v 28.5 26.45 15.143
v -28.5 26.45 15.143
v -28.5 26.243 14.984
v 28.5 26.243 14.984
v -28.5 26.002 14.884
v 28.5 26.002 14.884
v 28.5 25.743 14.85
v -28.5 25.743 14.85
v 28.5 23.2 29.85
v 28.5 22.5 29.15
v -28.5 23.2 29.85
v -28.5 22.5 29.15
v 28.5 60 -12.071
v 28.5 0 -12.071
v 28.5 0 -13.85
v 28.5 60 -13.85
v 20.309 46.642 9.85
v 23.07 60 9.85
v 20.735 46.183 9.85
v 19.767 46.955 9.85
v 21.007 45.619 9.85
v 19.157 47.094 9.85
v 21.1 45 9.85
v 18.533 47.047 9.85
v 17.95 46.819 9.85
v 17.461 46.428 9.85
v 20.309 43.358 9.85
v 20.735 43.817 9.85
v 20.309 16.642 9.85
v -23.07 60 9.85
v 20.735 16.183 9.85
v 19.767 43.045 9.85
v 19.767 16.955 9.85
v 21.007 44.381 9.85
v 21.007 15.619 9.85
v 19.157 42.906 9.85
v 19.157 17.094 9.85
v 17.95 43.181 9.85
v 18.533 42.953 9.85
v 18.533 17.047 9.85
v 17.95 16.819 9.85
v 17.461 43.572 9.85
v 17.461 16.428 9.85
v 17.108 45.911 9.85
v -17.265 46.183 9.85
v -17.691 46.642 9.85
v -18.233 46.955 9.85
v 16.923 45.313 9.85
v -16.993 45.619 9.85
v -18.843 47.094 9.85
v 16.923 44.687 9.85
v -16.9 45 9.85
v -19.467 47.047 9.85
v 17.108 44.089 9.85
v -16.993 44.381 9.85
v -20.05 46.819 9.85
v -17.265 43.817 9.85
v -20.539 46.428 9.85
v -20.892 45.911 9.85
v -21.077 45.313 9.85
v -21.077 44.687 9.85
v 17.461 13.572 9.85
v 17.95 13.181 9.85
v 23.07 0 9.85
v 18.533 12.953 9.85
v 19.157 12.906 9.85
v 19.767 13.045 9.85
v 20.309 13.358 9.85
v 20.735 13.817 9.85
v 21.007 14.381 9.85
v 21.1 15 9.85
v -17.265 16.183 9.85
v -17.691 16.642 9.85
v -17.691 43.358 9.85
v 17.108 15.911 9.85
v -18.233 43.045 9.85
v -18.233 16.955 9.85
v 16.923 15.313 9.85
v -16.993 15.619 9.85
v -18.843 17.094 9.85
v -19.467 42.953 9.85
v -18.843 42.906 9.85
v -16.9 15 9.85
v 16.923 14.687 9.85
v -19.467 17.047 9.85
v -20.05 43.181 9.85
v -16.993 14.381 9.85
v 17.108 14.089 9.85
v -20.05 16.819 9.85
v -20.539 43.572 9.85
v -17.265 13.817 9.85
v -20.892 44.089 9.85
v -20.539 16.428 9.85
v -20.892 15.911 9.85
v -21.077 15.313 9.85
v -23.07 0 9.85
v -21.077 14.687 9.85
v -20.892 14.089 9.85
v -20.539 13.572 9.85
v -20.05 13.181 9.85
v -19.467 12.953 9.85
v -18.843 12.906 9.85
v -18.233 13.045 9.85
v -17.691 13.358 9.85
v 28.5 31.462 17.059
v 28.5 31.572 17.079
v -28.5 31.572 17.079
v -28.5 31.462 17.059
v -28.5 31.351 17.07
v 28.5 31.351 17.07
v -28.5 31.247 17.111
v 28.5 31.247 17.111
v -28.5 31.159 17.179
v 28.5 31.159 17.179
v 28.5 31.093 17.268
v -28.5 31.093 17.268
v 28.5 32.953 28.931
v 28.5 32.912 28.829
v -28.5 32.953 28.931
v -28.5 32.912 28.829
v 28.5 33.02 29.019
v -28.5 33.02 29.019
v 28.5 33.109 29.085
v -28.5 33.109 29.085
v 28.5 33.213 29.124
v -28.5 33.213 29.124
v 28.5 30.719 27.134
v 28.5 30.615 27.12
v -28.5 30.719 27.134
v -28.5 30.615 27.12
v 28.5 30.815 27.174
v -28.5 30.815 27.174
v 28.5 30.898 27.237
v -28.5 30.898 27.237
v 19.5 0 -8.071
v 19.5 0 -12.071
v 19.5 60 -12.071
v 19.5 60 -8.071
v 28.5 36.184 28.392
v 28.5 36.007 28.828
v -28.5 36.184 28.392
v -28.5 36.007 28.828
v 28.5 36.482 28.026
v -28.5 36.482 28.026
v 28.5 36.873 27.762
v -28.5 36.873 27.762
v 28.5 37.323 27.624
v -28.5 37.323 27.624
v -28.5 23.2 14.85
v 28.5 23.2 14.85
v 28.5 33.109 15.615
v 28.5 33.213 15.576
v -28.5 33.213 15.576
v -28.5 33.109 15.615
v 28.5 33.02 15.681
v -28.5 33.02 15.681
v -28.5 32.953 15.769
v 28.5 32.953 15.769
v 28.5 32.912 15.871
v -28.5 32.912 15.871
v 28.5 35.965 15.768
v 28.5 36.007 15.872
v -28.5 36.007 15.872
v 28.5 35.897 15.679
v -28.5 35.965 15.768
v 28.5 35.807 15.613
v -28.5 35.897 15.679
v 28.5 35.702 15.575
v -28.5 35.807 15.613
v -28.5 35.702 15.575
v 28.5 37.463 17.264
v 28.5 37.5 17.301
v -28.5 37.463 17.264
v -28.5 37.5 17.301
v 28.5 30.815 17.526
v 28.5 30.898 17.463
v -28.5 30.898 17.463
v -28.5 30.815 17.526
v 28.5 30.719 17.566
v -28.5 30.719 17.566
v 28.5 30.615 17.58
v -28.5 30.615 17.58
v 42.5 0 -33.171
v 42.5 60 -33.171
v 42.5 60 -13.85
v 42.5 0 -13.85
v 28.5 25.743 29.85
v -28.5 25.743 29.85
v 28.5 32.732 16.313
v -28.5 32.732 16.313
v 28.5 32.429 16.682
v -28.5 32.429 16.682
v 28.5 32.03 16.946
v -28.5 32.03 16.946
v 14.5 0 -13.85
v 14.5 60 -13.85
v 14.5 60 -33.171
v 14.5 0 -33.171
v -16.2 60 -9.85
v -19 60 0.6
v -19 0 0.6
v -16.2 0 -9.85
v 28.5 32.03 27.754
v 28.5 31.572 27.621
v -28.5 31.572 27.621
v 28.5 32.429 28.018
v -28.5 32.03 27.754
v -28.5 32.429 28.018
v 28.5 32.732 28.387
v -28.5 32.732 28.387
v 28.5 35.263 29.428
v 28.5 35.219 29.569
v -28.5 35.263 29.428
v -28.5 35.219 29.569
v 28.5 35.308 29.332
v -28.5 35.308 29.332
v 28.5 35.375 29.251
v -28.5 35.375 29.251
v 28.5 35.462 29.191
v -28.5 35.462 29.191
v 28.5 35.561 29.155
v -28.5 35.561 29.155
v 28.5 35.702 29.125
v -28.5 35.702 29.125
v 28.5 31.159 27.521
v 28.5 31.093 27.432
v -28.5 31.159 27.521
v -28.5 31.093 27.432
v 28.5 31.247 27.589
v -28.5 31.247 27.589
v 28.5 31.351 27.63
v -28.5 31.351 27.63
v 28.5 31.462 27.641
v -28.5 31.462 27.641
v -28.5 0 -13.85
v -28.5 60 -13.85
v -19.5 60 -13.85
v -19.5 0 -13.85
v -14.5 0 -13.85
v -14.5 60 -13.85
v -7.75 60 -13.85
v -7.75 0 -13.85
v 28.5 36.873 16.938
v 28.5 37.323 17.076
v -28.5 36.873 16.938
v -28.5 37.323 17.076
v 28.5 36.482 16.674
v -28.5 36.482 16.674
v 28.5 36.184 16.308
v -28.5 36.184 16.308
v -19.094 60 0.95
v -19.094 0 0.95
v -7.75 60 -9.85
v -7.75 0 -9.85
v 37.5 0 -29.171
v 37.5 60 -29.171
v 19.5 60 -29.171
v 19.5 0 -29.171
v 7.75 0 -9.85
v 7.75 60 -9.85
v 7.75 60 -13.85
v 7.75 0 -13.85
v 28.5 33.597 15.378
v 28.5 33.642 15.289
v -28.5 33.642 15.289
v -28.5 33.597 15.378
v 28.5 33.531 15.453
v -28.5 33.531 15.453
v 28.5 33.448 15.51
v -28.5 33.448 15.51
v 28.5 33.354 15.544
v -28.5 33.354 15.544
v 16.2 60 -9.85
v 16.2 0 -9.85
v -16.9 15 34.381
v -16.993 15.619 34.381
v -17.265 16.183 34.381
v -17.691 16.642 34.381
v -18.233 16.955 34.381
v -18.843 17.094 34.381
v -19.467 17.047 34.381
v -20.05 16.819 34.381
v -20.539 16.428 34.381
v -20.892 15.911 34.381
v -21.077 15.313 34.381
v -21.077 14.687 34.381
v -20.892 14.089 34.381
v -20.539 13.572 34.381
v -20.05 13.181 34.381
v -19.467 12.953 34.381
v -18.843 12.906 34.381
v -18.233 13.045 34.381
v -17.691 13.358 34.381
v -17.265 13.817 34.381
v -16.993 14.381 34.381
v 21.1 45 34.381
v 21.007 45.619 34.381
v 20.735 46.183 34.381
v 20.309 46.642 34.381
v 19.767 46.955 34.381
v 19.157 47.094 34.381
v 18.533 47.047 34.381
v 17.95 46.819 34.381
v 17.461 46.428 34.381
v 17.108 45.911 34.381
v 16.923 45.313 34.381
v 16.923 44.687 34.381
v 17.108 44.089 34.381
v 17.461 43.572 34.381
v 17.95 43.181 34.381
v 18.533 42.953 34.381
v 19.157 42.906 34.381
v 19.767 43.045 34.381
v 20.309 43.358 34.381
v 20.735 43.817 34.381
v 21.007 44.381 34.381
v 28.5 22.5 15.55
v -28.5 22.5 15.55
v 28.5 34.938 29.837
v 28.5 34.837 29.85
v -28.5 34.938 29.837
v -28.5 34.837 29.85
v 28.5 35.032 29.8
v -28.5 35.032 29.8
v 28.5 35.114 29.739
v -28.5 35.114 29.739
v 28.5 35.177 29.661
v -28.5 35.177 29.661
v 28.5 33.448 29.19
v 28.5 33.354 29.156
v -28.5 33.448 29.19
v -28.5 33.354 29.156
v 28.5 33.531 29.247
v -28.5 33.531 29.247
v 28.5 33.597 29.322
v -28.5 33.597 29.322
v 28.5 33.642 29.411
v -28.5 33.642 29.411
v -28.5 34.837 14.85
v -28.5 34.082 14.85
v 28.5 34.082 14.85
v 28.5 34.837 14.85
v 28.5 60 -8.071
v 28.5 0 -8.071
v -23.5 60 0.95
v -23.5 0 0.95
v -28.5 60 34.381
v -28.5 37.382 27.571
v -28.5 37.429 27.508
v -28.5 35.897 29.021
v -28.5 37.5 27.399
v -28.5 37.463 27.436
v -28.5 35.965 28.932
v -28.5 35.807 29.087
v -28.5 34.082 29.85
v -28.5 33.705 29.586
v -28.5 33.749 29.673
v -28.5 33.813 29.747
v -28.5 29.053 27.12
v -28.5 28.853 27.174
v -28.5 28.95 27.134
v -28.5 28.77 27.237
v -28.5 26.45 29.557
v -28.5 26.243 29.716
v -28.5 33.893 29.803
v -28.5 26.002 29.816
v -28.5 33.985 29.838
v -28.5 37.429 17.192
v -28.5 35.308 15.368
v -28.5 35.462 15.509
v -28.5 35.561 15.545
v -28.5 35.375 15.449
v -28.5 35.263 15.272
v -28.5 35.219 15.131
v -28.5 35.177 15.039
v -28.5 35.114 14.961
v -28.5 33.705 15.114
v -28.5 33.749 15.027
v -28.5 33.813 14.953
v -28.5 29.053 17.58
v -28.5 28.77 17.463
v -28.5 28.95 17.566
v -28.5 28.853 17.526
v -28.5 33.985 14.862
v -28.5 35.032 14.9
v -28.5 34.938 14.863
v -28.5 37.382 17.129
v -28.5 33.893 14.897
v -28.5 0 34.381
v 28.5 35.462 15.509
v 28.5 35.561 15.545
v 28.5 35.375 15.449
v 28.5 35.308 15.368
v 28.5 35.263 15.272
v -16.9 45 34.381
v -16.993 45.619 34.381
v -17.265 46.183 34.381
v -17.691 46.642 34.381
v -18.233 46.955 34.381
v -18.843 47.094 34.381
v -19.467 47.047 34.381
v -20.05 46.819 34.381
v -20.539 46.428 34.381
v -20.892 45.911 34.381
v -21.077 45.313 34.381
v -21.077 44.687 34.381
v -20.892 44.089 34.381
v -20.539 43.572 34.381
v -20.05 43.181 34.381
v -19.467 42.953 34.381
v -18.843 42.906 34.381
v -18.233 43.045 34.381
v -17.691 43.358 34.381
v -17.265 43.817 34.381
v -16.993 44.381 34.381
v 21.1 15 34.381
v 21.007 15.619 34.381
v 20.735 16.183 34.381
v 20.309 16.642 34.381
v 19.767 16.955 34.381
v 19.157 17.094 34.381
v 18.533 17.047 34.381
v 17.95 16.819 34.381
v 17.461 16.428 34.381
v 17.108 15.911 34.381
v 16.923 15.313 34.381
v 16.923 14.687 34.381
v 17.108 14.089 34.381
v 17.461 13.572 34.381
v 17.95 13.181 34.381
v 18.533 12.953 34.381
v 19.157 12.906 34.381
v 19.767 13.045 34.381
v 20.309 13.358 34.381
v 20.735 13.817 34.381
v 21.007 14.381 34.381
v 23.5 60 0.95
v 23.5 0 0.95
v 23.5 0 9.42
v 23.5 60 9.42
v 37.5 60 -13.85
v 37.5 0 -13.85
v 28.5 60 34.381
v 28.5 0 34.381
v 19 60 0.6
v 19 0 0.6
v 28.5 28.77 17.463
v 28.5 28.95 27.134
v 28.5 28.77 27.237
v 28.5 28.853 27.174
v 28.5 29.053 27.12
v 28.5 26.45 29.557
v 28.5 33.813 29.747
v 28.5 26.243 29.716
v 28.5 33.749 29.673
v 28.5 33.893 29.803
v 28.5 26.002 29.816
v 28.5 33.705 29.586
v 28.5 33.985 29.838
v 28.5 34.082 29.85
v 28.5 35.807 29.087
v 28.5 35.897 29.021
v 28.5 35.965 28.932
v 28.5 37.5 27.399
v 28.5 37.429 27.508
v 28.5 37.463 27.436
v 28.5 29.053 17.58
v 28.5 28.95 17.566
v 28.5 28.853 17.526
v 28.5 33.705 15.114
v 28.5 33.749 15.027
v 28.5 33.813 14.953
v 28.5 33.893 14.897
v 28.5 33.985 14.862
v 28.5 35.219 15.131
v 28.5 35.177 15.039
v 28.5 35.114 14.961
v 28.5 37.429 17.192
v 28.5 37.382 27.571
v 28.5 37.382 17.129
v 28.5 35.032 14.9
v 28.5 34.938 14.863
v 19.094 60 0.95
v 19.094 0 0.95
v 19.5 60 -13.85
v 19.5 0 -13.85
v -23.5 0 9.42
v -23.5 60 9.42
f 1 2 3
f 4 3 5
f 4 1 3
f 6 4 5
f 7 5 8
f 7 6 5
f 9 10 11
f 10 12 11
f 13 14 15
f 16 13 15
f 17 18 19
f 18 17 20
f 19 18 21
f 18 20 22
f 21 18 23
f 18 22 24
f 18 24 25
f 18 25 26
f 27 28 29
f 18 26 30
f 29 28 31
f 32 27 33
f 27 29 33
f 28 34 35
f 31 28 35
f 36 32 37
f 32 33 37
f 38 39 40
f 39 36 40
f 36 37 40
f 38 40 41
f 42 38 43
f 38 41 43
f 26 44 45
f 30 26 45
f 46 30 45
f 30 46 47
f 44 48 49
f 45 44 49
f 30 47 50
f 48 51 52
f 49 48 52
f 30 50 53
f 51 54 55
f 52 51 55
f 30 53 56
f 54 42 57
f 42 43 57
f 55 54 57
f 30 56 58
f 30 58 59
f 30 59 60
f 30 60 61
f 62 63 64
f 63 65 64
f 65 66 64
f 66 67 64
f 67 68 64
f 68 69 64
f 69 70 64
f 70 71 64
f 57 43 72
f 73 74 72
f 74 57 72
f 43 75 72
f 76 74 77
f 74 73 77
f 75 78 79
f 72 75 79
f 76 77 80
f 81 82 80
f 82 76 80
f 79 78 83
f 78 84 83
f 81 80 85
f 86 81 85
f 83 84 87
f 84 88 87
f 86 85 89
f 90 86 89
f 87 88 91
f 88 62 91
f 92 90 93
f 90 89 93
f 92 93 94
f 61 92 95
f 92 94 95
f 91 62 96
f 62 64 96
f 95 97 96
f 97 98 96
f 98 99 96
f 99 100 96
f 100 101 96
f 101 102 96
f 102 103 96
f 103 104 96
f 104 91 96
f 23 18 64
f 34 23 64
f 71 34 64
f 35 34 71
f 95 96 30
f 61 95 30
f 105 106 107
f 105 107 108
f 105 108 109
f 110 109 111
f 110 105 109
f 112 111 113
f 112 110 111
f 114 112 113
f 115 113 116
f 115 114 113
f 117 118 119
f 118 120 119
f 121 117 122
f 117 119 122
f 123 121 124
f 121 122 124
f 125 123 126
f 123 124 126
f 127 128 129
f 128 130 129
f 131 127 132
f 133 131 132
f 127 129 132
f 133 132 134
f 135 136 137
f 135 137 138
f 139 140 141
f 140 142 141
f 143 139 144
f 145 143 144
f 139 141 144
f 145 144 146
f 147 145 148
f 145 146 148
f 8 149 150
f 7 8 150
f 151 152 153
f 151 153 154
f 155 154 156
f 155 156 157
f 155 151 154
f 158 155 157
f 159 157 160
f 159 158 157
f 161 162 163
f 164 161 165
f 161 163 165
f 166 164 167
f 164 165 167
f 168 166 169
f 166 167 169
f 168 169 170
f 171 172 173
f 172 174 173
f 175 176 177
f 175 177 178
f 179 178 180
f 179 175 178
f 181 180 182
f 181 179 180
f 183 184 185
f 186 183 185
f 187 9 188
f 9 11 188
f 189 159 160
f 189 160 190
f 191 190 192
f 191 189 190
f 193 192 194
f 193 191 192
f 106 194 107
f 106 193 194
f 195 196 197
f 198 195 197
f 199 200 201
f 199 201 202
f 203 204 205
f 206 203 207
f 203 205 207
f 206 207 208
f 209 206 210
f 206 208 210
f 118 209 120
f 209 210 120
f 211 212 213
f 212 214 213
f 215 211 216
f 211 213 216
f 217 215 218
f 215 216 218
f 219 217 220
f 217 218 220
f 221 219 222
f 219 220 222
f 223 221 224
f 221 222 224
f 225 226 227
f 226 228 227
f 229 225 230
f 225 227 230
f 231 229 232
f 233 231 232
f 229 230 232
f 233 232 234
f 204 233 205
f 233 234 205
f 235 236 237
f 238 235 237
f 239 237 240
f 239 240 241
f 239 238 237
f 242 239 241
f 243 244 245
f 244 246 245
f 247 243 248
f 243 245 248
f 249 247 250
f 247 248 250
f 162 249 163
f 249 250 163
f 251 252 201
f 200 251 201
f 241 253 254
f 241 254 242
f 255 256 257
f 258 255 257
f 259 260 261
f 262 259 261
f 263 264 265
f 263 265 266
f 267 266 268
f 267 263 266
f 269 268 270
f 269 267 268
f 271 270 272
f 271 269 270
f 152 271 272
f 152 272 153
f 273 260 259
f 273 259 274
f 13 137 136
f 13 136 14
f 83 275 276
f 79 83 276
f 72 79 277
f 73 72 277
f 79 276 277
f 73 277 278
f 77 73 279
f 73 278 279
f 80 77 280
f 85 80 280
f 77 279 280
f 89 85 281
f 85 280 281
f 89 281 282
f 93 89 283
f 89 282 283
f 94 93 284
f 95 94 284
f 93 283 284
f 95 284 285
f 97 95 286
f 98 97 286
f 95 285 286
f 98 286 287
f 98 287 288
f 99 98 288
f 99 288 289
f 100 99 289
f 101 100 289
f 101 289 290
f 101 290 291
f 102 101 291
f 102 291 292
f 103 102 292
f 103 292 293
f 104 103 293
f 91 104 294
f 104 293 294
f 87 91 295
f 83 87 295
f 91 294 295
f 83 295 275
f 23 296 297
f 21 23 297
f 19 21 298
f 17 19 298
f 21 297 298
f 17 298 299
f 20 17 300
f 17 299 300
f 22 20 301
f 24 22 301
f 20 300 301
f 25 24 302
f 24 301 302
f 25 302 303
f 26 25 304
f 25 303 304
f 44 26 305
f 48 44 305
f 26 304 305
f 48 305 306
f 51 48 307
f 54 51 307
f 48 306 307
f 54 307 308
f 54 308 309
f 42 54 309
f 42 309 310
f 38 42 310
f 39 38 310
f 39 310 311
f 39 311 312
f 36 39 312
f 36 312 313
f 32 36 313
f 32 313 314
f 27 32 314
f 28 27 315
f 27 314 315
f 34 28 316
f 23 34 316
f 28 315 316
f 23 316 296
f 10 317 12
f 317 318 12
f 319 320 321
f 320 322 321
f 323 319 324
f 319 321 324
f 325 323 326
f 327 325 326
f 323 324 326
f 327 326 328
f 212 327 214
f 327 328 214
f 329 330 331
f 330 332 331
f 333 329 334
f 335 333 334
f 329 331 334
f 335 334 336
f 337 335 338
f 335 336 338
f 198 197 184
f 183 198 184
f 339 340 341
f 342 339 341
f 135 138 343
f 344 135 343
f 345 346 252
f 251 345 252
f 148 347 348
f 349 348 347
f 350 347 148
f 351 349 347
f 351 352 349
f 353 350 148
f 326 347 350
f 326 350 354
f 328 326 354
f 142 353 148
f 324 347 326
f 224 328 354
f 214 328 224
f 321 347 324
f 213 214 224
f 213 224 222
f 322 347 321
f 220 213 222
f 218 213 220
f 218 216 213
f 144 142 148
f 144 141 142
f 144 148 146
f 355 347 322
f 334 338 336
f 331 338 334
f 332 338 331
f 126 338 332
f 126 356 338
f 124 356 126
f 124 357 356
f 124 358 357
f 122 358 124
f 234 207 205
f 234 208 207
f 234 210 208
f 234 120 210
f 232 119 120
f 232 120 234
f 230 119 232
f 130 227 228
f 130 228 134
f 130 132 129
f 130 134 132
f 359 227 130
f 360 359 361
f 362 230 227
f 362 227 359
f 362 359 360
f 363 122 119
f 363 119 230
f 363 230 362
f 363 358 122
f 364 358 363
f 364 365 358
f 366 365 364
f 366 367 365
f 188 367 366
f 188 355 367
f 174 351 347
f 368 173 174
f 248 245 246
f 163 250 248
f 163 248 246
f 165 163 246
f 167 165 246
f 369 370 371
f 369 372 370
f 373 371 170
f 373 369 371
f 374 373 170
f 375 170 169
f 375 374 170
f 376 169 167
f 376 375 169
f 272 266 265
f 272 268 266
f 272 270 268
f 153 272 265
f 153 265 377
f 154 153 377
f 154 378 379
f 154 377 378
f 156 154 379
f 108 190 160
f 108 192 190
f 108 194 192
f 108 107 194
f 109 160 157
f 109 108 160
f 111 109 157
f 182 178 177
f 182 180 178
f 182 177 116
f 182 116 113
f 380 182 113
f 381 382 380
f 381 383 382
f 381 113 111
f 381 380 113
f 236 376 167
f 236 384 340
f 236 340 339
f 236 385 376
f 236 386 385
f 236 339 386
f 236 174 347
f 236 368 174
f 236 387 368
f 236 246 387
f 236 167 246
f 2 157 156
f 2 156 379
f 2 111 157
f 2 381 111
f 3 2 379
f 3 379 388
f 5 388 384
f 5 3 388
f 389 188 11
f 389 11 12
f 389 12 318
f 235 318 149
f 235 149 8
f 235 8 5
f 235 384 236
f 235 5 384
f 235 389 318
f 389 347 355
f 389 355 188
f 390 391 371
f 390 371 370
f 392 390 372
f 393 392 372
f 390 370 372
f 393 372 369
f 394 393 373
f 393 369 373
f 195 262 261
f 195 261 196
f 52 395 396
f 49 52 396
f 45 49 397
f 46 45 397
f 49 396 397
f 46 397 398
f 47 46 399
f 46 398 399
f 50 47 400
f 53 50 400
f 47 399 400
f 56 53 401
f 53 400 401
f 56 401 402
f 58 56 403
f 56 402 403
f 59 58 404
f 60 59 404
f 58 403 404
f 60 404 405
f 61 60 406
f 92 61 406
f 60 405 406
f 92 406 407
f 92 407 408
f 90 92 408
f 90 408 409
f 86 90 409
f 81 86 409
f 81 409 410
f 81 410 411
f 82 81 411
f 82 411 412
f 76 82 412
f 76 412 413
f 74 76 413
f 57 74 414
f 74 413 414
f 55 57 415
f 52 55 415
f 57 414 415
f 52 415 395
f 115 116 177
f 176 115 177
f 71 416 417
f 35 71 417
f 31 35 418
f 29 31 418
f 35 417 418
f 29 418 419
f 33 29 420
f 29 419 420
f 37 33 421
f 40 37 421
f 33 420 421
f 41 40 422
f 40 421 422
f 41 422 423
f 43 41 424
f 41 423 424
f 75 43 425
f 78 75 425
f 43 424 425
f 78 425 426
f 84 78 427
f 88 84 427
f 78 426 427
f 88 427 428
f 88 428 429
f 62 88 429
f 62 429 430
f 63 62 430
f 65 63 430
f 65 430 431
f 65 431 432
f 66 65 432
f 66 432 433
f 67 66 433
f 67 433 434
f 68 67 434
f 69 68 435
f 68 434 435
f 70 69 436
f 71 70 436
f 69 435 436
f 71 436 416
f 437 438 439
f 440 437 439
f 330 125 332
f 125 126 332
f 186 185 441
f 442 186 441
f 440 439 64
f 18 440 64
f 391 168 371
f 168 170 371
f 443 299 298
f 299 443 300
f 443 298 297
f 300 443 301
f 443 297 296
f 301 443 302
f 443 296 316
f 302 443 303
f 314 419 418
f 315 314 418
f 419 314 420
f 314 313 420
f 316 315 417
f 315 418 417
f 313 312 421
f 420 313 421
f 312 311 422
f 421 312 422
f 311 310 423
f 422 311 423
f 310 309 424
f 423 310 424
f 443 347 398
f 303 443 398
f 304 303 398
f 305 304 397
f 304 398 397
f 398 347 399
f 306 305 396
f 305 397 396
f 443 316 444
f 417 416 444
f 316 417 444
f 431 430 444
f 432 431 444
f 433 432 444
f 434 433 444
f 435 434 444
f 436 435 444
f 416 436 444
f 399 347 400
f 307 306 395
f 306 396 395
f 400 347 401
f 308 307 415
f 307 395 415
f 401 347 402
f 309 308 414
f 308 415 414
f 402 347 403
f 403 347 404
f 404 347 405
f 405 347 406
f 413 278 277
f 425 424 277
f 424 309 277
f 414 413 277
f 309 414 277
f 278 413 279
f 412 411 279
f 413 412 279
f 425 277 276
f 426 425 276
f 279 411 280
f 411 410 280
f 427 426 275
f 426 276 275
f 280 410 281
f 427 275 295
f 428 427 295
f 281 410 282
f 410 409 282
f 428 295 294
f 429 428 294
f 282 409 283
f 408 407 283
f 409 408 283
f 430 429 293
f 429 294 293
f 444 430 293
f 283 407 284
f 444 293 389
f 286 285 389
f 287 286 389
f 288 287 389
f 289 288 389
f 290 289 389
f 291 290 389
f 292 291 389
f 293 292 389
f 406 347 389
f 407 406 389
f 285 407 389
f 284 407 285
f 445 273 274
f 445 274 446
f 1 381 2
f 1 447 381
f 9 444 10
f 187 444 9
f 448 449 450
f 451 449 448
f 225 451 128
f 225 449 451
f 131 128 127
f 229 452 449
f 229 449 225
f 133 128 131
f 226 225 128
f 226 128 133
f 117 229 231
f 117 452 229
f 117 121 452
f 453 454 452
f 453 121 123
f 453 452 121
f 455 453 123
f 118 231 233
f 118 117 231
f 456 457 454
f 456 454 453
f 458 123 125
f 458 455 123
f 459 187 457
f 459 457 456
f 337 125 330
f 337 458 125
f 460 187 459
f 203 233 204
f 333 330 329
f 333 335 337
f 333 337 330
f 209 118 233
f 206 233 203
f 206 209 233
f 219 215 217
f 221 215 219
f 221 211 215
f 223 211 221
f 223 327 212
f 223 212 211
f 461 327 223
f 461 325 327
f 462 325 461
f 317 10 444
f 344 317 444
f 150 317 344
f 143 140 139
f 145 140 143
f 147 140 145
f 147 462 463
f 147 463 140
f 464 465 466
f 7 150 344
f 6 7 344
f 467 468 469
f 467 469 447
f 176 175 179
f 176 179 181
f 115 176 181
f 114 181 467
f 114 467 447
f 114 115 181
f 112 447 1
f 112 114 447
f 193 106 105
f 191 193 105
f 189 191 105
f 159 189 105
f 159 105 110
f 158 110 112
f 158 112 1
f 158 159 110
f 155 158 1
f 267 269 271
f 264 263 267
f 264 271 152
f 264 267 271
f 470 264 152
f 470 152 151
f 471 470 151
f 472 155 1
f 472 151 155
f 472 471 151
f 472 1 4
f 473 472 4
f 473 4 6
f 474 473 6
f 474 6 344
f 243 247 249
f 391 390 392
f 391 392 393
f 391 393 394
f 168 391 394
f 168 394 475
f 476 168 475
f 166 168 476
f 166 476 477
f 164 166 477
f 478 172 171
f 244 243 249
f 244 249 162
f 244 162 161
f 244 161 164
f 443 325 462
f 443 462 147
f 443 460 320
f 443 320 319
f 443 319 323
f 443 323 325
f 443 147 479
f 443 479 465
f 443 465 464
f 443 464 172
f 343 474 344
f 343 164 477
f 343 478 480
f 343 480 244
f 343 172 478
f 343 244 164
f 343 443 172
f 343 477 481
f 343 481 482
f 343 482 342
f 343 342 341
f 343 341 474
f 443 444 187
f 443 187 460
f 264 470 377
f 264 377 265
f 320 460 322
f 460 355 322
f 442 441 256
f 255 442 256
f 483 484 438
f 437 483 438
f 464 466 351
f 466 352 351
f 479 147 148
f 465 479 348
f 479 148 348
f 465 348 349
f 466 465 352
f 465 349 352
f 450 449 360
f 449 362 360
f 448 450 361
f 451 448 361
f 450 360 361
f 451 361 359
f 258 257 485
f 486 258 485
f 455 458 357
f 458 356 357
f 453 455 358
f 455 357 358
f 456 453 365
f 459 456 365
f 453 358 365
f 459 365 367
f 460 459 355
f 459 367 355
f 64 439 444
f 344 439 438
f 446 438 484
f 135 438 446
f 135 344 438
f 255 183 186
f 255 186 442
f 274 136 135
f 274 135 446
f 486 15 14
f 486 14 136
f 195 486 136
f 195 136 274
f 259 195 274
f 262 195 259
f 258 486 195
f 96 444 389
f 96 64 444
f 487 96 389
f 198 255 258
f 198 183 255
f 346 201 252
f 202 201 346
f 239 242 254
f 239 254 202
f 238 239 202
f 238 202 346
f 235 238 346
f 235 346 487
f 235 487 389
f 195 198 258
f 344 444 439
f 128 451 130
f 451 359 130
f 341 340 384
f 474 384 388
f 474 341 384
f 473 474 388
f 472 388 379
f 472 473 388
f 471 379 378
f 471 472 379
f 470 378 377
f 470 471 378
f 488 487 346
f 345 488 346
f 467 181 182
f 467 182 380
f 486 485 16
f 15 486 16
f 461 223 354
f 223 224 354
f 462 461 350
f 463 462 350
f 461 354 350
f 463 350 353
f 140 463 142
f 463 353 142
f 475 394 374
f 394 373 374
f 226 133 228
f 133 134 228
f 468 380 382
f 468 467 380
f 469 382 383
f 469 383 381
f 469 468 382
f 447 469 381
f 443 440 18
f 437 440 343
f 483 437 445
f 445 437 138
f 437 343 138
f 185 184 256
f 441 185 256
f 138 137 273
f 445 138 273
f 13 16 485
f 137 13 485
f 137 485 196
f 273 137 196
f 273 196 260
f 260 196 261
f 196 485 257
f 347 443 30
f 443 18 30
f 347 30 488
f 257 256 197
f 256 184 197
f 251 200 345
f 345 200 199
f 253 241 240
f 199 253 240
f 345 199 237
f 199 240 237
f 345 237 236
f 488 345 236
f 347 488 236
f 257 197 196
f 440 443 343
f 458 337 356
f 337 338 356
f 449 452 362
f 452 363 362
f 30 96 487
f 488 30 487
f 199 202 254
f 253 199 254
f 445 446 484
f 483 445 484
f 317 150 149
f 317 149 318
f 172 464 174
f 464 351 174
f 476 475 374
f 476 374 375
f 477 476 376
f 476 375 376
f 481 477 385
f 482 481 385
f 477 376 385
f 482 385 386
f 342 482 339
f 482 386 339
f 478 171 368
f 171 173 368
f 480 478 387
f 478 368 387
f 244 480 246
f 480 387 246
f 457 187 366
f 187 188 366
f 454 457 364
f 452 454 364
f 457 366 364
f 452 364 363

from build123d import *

# Parameters (mm, degrees)
SKETCH1_W           = 57
SKETCH1_H           = 28.7
BOSS_EXTRUDE1_DEPTH = 60
SKETCH2_W           = 9
SKETCH2_H           = 4
CUT_EXTRUDE1_DEPTH  = 69.064473112
BOSS_EXTRUDE2_DEPTH = 28.5
SKETCH6_W           = 15.5
SKETCH6_H           = 15.390476131
CUT_EXTRUDE2_DEPTH  = 80
BOSS_EXTRUDE5_DEPTH = 60
SKETCH10_R          = 2.1
CUT_EXTRUDE3_DEPTH  = 24.530533394
SKETCH11_W          = 40.163550966
SKETCH11_H          = 20.084690285
CUT_EXTRUDE4_DEPTH  = 82.168165413
SKETCH12_W          = 9
SKETCH12_H          = 4
BOSS_EXTRUDE6_DEPTH = 60


with BuildPart() as part:
    # Sketch1 → Boss-Extrude1 (new body)
    with BuildSketch(Plane(origin=(0, 0, 0), x_dir=(1, 0, 0), z_dir=(0, 1, 0))):
        with Locations((0, -0.5)):
            Rectangle(SKETCH1_W, SKETCH1_H)
        Polygon((23.07, -9.85), (-23.07, -9.85), (-23.5, -9.42), (-23.5, -0.95), (-19.09385128, -0.95), (-19, -0.599742255), (-16.2, 9.85), (16.2, 9.85), (19, -0.599742255), (19.09385128, -0.95), (23.5, -0.95), (23.5, -2.9), (23.5, -9.42), align=None, mode=Mode.SUBTRACT)
    extrude(amount=BOSS_EXTRUDE1_DEPTH)

    # Sketch2 → Cut-Extrude1 (cut, through all)
    with BuildSketch(Plane.XZ):
        with Locations((24, -10.0706285)):
            Rectangle(SKETCH2_W, SKETCH2_H)
        with Locations((-24, -10.0706285)):
            Rectangle(SKETCH2_W, SKETCH2_H)
    extrude(amount=-CUT_EXTRUDE1_DEPTH, mode=Mode.SUBTRACT)

    # Sketch5 → Boss-Extrude2 (add, symmetric)
    with BuildSketch(Plane(origin=(0, 0, 0), x_dir=(0, 0, -1), z_dir=(1, 0, 0))):
        with BuildLine():
            Line((-14.85, 0), (-14.85, 23.200000017))
            Line((-14.85, 23.200000017), (-15.549999973, 22.50000003))
            Line((-15.549999973, 22.50000003), (-29.149999973, 22.50000003))
            Line((-29.149999973, 22.50000003), (-29.849999973, 23.20000003))
            Line((-29.849999973, 23.20000003), (-29.849999973, 25.743360053))
            ThreePointArc((-29.849999973, 25.743360053), (-29.773879502, 26.126043492), (-29.557106746, 26.450466847))
            Line((-29.557106746, 26.450466847), (-27.237157266, 28.770416328))
            ThreePointArc((-27.237157266, 28.770416328), (-27.150448162, 28.900185674), (-27.119999973, 29.053259055))
            Line((-27.119999973, 29.053259055), (-27.119999973, 30.615319642))
            ThreePointArc((-27.119999973, 30.615319642), (-27.150448164, 30.768393021), (-27.237157268, 30.898162365))
            Line((-27.237157268, 30.898162365), (-27.431588163, 31.09259326))
            ThreePointArc((-27.431588163, 31.09259326), (-27.613507965, 31.297692563), (-27.620638933, 31.57175403))
            ThreePointArc((-27.620638933, 31.57175403), (-28.017573243, 32.42857618), (-28.828543655, 32.91234062))
            ThreePointArc((-28.828543655, 32.91234062), (-29.01918836, 33.020436377), (-29.124259054, 33.212764861))
            Line((-29.124259054, 33.212764861), (-29.156235284, 33.354092333))
            ThreePointArc((-29.156235284, 33.354092333), (-29.24659278, 33.53064407), (-29.410649592, 33.642090719))
            Line((-29.410649592, 33.642090719), (-29.585724304, 33.70524196))
            ThreePointArc((-29.585724304, 33.70524196), (-29.777329878, 33.851609246), (-29.849999973, 34.081511694))
            Line((-29.849999973, 34.081511694), (-29.849999973, 34.837490602))
            ThreePointArc((-29.849999973, 34.837490602), (-29.772088513, 35.074680338), (-29.568705112, 35.219471078))
            Line((-29.568705112, 35.219471078), (-29.427668799, 35.263299846))
            ThreePointArc((-29.427668799, 35.263299846), (-29.25116358, 35.375371369), (-29.155313737, 35.561185593))
            Line((-29.155313737, 35.561185593), (-29.125010632, 35.702102112))
            ThreePointArc((-29.125010632, 35.702102112), (-29.020526118, 35.897067182), (-28.828406063, 36.006695082))
            ThreePointArc((-28.828406063, 36.006695082), (-28.025619489, 36.481556021), (-27.62403672, 37.32339358))
            ThreePointArc((-27.62403672, 37.32339358), (-27.540484938, 37.407225271), (-27.43605838, 37.46293655))
            Line((-27.43605838, 37.46293655), (-27.39899493, 37.5))
            Line((-27.39899493, 37.5), (-17.30100503, 37.5))
            Line((-17.30100503, 37.5), (-17.26394158, 37.46293655))
            ThreePointArc((-17.26394158, 37.46293655), (-17.159515017, 37.407225278), (-17.07596324, 37.32339358))
            ThreePointArc((-17.07596324, 37.32339358), (-16.674380468, 36.481556018), (-15.871593887, 36.006695079))
            ThreePointArc((-15.871593887, 36.006695079), (-15.679473839, 35.897067189), (-15.574989331, 35.702102127))
            Line((-15.574989331, 35.702102127), (-15.544686222, 35.561185587))
            ThreePointArc((-15.544686222, 35.561185587), (-15.448836377, 35.375371364), (-15.272331158, 35.263299843))
            Line((-15.272331158, 35.263299843), (-15.131294869, 35.219471083))
            ThreePointArc((-15.131294869, 35.219471083), (-14.927911462, 35.074680333), (-14.85, 34.837490586))
            Line((-14.85, 34.837490586), (-14.85, 60))
            Line((-14.85, 60), (-34.380533394, 60))
            Line((-34.380533394, 60), (-34.380533394, 0))
            Line((-34.380533394, 0), (-14.85, 0))
        make_face()
        with BuildLine():
            ThreePointArc((-15.142893227, 26.450466847), (-14.926120471, 26.126043492), (-14.85, 25.743360053))
            Line((-14.85, 25.743360053), (-14.85, 34.081511674))
            ThreePointArc((-14.85, 34.081511674), (-14.922670087, 33.851609245), (-15.114275644, 33.70524197))
            Line((-15.114275644, 33.70524197), (-15.289350386, 33.642090718))
            ThreePointArc((-15.289350386, 33.642090718), (-15.453407192, 33.53064407), (-15.543764688, 33.354092339))
            Line((-15.543764688, 33.354092339), (-15.57574092, 33.21276486))
            ThreePointArc((-15.57574092, 33.21276486), (-15.680811613, 33.020436377), (-15.871456319, 32.91234062))
            ThreePointArc((-15.871456319, 32.91234062), (-16.68242673, 32.42857618), (-17.07936104, 31.57175403))
            ThreePointArc((-17.07936104, 31.57175403), (-17.086492012, 31.297692565), (-17.26841181, 31.09259326))
            Line((-17.26841181, 31.09259326), (-17.462842708, 30.898162362))
            ThreePointArc((-17.462842708, 30.898162362), (-17.549551812, 30.768393016), (-17.58, 30.615319635))
            Line((-17.58, 30.615319635), (-17.58, 29.053259048))
            ThreePointArc((-17.58, 29.053259048), (-17.54955181, 28.900185669), (-17.462842705, 28.770416325))
            Line((-17.462842705, 28.770416325), (-15.142893227, 26.450466847))
        make_face()
    extrude(amount=BOSS_EXTRUDE2_DEPTH, both=True)

    # Sketch6 → Cut-Extrude2 (cut)
    with BuildSketch(Plane(origin=(0, 60, 0), x_dir=(1, 0, 0), z_dir=(0, 1, 0))):
        with Locations((0, 12.050145064)):
            Rectangle(SKETCH6_W, SKETCH6_H)
    extrude(amount=-CUT_EXTRUDE2_DEPTH, mode=Mode.SUBTRACT)

    # Sketch9 → Boss-Extrude5 (add)
    with BuildSketch(Plane(origin=(0, 60, 0), x_dir=(1, 0, 0), z_dir=(0, 1, 0))):
        Polygon((-19.5, 13.85), (-19.5, 29.1706285), (-37.5, 29.1706285), (-37.5, 13.85), (-42.5, 13.85), (-42.5, 33.1706285), (-14.5, 33.1706285), (-14.5, 13.85), align=None)
        Polygon((37.5, 13.85), (37.5, 29.1706285), (19.5, 29.1706285), (19.5, 13.85), (14.5, 13.85), (14.5, 33.1706285), (42.5, 33.1706285), (42.5, 13.85), align=None)
    extrude(amount=-BOSS_EXTRUDE5_DEPTH)

    # Sketch10 → Cut-Extrude3 (cut)
    with BuildSketch(Plane.XY.offset(34.380533394)):
        with Locations((-19, 45)):
            Circle(SKETCH10_R)
        with Locations((19, 45)):
            Circle(SKETCH10_R)
        with Locations((-19, 15)):
            Circle(SKETCH10_R)
        with Locations((19, 15)):
            Circle(SKETCH10_R)
    extrude(amount=-CUT_EXTRUDE3_DEPTH, mode=Mode.SUBTRACT)

    # Sketch11 → Cut-Extrude4 (cut, through all)
    with BuildSketch(Plane.XZ):
        with Locations((-27.831775483, -23.892345143)):
            Rectangle(SKETCH11_W, SKETCH11_H)
    extrude(amount=-CUT_EXTRUDE4_DEPTH, mode=Mode.SUBTRACT)

    # Sketch12 → Boss-Extrude6 (add, through all)
    with BuildSketch(Plane(origin=(0, 0, 0), x_dir=(-1, 0, 0), z_dir=(0, -1, 0))):
        with Locations((24, 10.0706285)):
            Rectangle(SKETCH12_W, SKETCH12_H)
    extrude(amount=-BOSS_EXTRUDE6_DEPTH)


solid = part.part
